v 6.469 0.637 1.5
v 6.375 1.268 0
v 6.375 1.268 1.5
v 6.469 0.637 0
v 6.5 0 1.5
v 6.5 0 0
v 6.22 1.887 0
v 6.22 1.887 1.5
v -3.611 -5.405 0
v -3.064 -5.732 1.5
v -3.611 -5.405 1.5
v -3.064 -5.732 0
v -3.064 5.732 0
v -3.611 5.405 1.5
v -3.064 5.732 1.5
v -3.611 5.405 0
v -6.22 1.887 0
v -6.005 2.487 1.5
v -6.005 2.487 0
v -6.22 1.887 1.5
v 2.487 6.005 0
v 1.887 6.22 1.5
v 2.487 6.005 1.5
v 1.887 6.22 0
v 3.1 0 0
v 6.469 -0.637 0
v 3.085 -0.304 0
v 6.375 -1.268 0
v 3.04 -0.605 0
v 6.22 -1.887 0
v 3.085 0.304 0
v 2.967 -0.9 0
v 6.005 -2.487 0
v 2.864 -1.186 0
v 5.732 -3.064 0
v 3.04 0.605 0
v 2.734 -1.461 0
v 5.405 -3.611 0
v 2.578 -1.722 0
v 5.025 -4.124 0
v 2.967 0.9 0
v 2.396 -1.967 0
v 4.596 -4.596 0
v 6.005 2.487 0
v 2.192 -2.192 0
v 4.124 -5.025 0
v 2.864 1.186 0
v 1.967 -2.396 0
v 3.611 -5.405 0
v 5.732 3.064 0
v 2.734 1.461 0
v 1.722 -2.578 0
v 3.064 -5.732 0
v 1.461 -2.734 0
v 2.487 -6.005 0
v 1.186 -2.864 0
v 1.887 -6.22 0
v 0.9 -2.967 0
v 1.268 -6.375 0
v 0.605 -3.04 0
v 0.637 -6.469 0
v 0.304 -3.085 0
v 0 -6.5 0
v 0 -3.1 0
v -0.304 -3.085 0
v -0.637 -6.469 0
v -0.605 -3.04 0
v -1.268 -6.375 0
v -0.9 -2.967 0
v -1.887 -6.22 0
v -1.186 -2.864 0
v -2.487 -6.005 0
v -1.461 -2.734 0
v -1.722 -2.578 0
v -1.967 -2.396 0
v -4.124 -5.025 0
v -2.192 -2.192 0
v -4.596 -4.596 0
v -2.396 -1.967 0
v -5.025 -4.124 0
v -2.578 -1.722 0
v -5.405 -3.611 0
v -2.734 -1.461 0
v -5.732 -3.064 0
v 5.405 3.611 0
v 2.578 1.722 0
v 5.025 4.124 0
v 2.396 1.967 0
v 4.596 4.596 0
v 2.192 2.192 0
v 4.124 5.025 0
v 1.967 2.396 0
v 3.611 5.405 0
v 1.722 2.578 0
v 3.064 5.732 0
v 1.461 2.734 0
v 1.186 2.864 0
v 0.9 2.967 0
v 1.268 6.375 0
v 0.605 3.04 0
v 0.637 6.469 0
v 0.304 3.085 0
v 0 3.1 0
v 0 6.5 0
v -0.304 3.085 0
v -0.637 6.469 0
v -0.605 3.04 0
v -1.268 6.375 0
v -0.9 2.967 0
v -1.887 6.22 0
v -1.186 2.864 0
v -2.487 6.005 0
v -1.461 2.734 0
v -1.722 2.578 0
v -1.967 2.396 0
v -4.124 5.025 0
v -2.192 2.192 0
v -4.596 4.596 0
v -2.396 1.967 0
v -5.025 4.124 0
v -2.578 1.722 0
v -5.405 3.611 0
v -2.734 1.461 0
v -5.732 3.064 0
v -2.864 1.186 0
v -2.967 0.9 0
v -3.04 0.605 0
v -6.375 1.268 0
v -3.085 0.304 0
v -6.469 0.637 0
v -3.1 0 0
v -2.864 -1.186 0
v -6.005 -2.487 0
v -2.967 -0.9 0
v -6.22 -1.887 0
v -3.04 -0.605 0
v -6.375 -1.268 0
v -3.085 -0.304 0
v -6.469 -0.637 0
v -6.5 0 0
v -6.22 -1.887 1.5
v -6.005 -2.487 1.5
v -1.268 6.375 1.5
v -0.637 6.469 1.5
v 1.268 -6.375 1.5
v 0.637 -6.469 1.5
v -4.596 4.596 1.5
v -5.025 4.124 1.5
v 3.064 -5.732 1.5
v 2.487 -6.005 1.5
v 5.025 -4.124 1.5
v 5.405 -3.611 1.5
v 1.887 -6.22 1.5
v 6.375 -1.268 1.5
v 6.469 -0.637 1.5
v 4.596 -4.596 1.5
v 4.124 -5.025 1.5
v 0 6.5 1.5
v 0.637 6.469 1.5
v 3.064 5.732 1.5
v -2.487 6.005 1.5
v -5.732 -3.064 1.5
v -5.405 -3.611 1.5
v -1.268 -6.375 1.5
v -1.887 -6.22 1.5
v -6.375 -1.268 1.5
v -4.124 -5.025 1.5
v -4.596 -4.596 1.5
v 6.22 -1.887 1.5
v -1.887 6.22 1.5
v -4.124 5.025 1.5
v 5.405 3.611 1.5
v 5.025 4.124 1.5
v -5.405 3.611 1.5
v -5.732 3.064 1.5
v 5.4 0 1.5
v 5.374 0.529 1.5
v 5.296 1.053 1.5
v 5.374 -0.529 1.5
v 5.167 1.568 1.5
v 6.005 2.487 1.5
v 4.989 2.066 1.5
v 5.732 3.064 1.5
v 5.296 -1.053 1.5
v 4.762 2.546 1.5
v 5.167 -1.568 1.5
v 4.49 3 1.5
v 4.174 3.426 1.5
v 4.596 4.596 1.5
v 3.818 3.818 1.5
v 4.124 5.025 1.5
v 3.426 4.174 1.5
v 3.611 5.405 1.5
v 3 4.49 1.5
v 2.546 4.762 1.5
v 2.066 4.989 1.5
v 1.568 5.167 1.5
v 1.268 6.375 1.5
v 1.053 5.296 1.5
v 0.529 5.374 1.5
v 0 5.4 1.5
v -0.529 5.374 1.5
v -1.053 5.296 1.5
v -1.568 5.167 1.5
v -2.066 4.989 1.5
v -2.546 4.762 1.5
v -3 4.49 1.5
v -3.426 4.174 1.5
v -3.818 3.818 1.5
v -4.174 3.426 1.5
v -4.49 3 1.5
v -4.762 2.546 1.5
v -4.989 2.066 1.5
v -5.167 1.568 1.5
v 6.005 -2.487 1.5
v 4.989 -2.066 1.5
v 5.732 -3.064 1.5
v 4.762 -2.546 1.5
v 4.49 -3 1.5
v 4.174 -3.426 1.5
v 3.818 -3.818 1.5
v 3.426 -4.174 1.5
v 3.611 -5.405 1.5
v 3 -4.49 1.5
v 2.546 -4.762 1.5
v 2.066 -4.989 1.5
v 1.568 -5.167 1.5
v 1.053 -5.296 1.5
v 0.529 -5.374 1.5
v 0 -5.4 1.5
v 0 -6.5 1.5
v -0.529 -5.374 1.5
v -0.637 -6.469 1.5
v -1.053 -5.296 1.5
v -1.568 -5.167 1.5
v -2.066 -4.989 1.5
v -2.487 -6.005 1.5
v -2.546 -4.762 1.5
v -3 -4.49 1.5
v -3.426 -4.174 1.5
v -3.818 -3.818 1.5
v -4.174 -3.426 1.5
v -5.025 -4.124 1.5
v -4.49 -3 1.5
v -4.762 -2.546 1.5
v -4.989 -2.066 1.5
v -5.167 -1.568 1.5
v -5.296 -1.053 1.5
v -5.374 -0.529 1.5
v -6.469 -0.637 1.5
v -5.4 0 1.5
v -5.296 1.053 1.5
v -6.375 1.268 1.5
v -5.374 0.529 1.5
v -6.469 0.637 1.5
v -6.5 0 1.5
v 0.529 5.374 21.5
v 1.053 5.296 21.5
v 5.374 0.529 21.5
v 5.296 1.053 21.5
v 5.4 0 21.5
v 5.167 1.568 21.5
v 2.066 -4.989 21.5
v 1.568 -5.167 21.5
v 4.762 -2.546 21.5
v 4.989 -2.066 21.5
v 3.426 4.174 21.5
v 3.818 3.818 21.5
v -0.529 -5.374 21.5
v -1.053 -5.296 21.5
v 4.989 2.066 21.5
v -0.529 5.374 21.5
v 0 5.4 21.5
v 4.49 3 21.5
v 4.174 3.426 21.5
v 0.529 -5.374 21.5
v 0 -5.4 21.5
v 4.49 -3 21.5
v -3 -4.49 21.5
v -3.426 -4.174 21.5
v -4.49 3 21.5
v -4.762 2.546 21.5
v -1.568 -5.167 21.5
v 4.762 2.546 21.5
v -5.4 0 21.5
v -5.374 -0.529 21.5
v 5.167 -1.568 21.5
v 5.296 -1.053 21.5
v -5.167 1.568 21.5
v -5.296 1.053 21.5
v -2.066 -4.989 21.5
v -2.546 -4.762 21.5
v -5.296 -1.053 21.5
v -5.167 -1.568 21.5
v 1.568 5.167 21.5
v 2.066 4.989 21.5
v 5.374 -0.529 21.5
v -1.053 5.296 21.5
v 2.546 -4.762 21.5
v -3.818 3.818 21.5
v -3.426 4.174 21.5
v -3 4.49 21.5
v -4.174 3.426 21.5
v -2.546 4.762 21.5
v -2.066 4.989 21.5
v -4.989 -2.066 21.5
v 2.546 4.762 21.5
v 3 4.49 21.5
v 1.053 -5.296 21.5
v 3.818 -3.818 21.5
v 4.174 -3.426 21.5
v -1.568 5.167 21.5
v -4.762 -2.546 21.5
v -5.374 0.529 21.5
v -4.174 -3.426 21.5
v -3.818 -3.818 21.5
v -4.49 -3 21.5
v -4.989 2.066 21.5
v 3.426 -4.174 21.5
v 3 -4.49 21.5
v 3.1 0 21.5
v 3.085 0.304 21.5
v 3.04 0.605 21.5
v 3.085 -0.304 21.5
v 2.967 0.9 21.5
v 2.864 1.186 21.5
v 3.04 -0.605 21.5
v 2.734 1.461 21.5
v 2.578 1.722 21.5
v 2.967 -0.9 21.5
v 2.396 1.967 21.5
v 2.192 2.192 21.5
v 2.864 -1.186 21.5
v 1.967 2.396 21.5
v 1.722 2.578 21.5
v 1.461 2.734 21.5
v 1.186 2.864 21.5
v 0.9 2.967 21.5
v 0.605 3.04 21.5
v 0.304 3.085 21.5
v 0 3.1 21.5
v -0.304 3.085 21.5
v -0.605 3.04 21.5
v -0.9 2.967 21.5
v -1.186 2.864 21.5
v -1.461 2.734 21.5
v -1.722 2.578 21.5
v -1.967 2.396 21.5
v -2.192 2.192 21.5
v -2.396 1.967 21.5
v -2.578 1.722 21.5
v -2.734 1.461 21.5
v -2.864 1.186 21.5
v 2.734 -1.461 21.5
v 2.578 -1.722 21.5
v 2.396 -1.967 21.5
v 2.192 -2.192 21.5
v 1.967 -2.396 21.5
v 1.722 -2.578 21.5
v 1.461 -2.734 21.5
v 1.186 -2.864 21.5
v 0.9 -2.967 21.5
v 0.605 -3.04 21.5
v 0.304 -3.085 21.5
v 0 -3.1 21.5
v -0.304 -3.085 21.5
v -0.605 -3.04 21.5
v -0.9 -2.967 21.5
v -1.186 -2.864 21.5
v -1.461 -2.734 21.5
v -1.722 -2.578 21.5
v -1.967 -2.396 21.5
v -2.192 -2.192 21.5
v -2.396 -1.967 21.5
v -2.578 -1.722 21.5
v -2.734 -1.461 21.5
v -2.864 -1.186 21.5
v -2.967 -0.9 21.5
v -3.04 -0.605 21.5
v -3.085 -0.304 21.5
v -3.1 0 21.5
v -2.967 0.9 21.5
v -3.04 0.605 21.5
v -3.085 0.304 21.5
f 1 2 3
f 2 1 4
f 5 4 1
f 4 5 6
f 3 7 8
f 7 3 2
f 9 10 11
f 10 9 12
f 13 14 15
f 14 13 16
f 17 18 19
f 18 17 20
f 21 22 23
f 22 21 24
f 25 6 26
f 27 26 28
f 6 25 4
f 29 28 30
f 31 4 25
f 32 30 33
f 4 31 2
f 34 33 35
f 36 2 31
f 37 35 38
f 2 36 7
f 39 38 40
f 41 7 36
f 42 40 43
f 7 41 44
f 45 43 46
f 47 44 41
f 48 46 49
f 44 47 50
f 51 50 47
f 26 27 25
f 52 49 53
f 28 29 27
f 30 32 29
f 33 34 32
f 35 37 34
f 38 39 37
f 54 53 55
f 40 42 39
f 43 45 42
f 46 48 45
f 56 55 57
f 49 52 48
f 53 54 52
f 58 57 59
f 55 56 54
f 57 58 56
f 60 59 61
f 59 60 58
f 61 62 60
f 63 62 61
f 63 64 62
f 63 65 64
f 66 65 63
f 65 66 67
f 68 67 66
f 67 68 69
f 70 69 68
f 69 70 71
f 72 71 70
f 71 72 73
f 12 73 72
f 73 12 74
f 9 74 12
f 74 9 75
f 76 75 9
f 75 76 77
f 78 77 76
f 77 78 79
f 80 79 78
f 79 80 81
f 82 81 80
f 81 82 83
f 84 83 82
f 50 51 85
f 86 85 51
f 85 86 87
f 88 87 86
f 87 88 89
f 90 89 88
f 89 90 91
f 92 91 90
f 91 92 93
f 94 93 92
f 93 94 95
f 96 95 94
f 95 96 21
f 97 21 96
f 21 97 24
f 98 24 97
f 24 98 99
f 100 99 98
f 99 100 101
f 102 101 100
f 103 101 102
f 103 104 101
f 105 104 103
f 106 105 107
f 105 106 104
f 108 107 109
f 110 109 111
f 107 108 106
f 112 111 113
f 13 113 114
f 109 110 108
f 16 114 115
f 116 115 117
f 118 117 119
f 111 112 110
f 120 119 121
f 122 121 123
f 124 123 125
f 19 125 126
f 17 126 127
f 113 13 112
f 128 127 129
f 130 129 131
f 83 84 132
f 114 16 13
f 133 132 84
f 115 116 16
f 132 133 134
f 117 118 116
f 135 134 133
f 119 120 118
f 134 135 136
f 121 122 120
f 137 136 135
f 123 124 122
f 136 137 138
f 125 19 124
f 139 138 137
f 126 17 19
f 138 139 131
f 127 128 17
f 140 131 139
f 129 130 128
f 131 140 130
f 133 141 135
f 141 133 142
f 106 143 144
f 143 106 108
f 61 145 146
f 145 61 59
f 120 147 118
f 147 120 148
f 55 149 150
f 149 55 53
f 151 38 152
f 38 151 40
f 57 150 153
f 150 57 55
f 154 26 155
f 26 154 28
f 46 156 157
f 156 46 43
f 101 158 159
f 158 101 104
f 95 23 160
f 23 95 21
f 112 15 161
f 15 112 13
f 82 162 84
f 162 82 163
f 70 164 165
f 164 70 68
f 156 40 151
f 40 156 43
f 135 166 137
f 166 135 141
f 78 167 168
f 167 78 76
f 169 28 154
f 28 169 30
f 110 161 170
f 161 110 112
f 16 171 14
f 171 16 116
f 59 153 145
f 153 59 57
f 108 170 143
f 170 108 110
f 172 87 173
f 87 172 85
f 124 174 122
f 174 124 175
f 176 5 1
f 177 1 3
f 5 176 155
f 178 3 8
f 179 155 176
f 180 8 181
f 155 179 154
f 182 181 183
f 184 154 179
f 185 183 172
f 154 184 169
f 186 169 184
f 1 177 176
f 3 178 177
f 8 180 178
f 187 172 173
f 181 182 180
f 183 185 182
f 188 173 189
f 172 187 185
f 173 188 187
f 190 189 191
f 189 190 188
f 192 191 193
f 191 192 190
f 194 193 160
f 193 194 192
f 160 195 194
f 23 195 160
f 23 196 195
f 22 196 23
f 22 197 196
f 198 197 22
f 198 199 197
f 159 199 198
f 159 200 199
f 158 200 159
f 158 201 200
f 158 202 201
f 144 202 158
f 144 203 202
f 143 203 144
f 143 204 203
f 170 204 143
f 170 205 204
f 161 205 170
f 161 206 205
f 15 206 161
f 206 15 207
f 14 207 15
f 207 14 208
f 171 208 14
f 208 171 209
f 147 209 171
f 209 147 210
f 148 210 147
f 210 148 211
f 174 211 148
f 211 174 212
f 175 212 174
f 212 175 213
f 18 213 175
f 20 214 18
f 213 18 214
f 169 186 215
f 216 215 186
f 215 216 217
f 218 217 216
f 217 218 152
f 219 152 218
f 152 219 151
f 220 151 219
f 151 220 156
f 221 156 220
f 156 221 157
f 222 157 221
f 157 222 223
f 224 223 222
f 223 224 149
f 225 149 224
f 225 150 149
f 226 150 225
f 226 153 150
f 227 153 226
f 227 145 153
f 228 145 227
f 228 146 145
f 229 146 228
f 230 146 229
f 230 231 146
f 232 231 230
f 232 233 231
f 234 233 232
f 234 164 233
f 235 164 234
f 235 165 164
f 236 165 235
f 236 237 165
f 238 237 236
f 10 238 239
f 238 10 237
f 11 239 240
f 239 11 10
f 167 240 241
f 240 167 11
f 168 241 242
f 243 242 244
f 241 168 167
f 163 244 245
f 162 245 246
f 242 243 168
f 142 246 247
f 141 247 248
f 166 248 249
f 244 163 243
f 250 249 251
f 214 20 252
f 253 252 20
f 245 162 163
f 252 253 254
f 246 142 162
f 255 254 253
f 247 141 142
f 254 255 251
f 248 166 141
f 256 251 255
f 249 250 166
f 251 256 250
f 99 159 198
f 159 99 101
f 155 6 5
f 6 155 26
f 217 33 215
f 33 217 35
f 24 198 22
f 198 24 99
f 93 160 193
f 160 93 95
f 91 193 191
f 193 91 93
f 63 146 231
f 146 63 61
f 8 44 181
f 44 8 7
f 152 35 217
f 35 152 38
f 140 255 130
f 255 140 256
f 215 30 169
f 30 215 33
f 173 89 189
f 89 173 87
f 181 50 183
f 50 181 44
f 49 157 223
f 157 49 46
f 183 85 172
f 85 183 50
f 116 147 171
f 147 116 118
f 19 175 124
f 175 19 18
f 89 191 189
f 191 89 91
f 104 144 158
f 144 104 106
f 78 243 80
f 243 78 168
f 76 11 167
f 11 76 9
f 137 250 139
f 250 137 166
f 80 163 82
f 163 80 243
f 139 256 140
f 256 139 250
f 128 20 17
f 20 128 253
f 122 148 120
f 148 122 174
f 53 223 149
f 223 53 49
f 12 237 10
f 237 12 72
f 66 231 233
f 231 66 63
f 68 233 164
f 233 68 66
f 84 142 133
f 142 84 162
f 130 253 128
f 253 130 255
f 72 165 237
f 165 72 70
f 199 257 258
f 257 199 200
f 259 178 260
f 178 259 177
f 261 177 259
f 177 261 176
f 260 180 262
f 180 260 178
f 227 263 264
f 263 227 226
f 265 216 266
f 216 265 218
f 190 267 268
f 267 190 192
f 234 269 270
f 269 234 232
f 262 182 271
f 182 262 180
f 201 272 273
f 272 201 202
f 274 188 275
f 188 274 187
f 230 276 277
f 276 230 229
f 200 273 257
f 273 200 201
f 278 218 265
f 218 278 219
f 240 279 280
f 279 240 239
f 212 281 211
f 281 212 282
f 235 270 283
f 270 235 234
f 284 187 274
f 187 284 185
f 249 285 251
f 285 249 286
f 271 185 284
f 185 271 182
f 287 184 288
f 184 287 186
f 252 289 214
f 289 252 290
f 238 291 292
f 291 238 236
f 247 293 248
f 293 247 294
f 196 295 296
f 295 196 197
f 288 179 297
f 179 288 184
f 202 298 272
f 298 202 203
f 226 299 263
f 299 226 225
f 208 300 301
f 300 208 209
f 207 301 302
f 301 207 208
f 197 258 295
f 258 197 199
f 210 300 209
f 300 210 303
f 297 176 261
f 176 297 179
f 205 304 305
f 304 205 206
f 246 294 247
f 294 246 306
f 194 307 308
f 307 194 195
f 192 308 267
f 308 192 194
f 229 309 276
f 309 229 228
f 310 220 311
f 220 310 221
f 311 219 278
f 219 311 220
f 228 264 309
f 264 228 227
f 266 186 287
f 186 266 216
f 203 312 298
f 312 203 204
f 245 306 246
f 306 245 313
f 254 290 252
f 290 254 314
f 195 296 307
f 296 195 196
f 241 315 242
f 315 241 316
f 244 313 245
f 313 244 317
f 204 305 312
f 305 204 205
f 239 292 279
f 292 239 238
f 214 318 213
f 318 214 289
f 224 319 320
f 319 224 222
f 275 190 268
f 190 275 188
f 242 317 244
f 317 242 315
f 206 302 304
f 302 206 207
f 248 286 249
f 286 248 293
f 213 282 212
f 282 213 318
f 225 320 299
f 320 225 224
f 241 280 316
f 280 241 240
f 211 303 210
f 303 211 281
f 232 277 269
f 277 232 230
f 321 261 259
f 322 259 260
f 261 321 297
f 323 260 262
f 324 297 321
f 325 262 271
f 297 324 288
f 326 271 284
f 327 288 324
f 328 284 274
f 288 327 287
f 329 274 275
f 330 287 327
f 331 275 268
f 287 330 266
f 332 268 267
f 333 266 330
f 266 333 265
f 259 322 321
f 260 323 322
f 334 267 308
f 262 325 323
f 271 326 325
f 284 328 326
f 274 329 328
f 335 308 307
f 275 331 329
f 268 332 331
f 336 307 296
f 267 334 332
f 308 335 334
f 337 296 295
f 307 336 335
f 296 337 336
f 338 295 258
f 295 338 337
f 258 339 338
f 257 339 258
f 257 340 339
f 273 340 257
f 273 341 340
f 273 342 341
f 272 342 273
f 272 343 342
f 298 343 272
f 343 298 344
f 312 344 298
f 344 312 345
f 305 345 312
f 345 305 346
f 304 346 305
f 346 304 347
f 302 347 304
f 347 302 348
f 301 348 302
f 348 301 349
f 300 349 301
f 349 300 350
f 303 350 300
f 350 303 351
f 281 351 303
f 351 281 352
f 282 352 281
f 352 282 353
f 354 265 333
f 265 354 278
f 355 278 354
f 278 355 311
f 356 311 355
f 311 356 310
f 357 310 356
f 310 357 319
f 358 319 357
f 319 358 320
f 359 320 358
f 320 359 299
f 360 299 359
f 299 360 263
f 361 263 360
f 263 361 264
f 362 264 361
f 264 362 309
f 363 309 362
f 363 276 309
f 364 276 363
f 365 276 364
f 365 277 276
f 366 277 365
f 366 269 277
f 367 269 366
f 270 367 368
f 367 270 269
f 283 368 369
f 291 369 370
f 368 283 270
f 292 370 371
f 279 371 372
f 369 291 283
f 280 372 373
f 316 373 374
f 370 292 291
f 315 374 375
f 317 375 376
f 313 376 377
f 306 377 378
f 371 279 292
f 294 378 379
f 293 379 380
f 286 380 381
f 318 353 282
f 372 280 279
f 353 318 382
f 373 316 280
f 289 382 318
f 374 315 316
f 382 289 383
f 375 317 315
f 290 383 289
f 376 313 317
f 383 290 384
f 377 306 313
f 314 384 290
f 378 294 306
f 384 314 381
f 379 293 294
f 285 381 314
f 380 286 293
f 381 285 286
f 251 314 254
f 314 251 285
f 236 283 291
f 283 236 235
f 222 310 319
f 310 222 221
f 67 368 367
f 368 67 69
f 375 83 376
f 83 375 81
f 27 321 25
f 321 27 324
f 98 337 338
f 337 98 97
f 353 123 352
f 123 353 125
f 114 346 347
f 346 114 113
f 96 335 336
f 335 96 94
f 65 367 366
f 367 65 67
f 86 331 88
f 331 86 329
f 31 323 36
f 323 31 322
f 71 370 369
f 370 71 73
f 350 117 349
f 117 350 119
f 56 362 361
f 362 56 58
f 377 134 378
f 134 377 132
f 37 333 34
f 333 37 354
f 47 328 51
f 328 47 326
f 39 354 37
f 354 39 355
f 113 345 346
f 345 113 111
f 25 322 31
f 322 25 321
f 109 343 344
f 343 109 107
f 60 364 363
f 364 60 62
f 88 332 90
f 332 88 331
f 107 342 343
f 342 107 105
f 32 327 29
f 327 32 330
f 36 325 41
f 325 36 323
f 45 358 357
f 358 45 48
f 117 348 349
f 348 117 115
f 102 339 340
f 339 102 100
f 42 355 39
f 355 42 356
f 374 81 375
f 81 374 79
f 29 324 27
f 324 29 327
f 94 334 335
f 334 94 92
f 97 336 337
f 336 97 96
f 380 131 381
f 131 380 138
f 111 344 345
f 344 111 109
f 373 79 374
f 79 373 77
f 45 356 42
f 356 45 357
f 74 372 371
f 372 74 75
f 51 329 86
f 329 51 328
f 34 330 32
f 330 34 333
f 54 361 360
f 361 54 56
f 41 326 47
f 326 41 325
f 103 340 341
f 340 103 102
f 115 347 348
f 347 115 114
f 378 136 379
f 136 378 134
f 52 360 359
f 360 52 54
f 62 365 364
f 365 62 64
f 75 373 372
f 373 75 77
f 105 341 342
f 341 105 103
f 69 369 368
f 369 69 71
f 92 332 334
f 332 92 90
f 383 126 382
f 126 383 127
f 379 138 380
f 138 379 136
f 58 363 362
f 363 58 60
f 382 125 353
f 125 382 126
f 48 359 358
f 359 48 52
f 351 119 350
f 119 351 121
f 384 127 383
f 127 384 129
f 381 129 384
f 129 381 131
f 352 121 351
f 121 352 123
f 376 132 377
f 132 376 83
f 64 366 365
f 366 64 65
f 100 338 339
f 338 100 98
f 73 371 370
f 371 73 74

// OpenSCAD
// --- Dimensions (mm) ---
collar_diameter = 13.0;      // Diameter of the base collar
collar_thickness = 1.5;      // Height of the base collar
sleeve_outer_diameter = 10.8; // Diameter of the main sleeve body
sleeve_height_total = 21.5;  // Total height from Z=0 to top of sleeve
bore_diameter = 6.2;         // Diameter of the central hole

// --- Resolution ---
$fn = 64;

// --- Implementation ---

// The part is built by taking the union of the collar and sleeve,
// and then subtracting the central bore.
difference() {
    // 1. The Solid Body (Union of Collar and Sleeve)
    union() {
        // The Base Collar (z = 0 to 1.5)
        cylinder(d = collar_diameter, h = collar_thickness);

        // The Sleeve Body (rises from top of collar to z = 21.5)
        // Height of this cylinder is (21.5 - 1.5) = 20.0
        translate([0, 0, collar_thickness])
            cylinder(d = sleeve_outer_diameter, h = sleeve_height_total - collar_thickness);
    }

    // 2. The Central Bore (Subtraction)
    // We extend the cylinder by 1mm above and below the part 
    // to ensure a clean cut through the faces.
    translate([0, 0, -1.0])
        cylinder(d = bore_diameter, h = sleeve_height_total + 2.0);
}
